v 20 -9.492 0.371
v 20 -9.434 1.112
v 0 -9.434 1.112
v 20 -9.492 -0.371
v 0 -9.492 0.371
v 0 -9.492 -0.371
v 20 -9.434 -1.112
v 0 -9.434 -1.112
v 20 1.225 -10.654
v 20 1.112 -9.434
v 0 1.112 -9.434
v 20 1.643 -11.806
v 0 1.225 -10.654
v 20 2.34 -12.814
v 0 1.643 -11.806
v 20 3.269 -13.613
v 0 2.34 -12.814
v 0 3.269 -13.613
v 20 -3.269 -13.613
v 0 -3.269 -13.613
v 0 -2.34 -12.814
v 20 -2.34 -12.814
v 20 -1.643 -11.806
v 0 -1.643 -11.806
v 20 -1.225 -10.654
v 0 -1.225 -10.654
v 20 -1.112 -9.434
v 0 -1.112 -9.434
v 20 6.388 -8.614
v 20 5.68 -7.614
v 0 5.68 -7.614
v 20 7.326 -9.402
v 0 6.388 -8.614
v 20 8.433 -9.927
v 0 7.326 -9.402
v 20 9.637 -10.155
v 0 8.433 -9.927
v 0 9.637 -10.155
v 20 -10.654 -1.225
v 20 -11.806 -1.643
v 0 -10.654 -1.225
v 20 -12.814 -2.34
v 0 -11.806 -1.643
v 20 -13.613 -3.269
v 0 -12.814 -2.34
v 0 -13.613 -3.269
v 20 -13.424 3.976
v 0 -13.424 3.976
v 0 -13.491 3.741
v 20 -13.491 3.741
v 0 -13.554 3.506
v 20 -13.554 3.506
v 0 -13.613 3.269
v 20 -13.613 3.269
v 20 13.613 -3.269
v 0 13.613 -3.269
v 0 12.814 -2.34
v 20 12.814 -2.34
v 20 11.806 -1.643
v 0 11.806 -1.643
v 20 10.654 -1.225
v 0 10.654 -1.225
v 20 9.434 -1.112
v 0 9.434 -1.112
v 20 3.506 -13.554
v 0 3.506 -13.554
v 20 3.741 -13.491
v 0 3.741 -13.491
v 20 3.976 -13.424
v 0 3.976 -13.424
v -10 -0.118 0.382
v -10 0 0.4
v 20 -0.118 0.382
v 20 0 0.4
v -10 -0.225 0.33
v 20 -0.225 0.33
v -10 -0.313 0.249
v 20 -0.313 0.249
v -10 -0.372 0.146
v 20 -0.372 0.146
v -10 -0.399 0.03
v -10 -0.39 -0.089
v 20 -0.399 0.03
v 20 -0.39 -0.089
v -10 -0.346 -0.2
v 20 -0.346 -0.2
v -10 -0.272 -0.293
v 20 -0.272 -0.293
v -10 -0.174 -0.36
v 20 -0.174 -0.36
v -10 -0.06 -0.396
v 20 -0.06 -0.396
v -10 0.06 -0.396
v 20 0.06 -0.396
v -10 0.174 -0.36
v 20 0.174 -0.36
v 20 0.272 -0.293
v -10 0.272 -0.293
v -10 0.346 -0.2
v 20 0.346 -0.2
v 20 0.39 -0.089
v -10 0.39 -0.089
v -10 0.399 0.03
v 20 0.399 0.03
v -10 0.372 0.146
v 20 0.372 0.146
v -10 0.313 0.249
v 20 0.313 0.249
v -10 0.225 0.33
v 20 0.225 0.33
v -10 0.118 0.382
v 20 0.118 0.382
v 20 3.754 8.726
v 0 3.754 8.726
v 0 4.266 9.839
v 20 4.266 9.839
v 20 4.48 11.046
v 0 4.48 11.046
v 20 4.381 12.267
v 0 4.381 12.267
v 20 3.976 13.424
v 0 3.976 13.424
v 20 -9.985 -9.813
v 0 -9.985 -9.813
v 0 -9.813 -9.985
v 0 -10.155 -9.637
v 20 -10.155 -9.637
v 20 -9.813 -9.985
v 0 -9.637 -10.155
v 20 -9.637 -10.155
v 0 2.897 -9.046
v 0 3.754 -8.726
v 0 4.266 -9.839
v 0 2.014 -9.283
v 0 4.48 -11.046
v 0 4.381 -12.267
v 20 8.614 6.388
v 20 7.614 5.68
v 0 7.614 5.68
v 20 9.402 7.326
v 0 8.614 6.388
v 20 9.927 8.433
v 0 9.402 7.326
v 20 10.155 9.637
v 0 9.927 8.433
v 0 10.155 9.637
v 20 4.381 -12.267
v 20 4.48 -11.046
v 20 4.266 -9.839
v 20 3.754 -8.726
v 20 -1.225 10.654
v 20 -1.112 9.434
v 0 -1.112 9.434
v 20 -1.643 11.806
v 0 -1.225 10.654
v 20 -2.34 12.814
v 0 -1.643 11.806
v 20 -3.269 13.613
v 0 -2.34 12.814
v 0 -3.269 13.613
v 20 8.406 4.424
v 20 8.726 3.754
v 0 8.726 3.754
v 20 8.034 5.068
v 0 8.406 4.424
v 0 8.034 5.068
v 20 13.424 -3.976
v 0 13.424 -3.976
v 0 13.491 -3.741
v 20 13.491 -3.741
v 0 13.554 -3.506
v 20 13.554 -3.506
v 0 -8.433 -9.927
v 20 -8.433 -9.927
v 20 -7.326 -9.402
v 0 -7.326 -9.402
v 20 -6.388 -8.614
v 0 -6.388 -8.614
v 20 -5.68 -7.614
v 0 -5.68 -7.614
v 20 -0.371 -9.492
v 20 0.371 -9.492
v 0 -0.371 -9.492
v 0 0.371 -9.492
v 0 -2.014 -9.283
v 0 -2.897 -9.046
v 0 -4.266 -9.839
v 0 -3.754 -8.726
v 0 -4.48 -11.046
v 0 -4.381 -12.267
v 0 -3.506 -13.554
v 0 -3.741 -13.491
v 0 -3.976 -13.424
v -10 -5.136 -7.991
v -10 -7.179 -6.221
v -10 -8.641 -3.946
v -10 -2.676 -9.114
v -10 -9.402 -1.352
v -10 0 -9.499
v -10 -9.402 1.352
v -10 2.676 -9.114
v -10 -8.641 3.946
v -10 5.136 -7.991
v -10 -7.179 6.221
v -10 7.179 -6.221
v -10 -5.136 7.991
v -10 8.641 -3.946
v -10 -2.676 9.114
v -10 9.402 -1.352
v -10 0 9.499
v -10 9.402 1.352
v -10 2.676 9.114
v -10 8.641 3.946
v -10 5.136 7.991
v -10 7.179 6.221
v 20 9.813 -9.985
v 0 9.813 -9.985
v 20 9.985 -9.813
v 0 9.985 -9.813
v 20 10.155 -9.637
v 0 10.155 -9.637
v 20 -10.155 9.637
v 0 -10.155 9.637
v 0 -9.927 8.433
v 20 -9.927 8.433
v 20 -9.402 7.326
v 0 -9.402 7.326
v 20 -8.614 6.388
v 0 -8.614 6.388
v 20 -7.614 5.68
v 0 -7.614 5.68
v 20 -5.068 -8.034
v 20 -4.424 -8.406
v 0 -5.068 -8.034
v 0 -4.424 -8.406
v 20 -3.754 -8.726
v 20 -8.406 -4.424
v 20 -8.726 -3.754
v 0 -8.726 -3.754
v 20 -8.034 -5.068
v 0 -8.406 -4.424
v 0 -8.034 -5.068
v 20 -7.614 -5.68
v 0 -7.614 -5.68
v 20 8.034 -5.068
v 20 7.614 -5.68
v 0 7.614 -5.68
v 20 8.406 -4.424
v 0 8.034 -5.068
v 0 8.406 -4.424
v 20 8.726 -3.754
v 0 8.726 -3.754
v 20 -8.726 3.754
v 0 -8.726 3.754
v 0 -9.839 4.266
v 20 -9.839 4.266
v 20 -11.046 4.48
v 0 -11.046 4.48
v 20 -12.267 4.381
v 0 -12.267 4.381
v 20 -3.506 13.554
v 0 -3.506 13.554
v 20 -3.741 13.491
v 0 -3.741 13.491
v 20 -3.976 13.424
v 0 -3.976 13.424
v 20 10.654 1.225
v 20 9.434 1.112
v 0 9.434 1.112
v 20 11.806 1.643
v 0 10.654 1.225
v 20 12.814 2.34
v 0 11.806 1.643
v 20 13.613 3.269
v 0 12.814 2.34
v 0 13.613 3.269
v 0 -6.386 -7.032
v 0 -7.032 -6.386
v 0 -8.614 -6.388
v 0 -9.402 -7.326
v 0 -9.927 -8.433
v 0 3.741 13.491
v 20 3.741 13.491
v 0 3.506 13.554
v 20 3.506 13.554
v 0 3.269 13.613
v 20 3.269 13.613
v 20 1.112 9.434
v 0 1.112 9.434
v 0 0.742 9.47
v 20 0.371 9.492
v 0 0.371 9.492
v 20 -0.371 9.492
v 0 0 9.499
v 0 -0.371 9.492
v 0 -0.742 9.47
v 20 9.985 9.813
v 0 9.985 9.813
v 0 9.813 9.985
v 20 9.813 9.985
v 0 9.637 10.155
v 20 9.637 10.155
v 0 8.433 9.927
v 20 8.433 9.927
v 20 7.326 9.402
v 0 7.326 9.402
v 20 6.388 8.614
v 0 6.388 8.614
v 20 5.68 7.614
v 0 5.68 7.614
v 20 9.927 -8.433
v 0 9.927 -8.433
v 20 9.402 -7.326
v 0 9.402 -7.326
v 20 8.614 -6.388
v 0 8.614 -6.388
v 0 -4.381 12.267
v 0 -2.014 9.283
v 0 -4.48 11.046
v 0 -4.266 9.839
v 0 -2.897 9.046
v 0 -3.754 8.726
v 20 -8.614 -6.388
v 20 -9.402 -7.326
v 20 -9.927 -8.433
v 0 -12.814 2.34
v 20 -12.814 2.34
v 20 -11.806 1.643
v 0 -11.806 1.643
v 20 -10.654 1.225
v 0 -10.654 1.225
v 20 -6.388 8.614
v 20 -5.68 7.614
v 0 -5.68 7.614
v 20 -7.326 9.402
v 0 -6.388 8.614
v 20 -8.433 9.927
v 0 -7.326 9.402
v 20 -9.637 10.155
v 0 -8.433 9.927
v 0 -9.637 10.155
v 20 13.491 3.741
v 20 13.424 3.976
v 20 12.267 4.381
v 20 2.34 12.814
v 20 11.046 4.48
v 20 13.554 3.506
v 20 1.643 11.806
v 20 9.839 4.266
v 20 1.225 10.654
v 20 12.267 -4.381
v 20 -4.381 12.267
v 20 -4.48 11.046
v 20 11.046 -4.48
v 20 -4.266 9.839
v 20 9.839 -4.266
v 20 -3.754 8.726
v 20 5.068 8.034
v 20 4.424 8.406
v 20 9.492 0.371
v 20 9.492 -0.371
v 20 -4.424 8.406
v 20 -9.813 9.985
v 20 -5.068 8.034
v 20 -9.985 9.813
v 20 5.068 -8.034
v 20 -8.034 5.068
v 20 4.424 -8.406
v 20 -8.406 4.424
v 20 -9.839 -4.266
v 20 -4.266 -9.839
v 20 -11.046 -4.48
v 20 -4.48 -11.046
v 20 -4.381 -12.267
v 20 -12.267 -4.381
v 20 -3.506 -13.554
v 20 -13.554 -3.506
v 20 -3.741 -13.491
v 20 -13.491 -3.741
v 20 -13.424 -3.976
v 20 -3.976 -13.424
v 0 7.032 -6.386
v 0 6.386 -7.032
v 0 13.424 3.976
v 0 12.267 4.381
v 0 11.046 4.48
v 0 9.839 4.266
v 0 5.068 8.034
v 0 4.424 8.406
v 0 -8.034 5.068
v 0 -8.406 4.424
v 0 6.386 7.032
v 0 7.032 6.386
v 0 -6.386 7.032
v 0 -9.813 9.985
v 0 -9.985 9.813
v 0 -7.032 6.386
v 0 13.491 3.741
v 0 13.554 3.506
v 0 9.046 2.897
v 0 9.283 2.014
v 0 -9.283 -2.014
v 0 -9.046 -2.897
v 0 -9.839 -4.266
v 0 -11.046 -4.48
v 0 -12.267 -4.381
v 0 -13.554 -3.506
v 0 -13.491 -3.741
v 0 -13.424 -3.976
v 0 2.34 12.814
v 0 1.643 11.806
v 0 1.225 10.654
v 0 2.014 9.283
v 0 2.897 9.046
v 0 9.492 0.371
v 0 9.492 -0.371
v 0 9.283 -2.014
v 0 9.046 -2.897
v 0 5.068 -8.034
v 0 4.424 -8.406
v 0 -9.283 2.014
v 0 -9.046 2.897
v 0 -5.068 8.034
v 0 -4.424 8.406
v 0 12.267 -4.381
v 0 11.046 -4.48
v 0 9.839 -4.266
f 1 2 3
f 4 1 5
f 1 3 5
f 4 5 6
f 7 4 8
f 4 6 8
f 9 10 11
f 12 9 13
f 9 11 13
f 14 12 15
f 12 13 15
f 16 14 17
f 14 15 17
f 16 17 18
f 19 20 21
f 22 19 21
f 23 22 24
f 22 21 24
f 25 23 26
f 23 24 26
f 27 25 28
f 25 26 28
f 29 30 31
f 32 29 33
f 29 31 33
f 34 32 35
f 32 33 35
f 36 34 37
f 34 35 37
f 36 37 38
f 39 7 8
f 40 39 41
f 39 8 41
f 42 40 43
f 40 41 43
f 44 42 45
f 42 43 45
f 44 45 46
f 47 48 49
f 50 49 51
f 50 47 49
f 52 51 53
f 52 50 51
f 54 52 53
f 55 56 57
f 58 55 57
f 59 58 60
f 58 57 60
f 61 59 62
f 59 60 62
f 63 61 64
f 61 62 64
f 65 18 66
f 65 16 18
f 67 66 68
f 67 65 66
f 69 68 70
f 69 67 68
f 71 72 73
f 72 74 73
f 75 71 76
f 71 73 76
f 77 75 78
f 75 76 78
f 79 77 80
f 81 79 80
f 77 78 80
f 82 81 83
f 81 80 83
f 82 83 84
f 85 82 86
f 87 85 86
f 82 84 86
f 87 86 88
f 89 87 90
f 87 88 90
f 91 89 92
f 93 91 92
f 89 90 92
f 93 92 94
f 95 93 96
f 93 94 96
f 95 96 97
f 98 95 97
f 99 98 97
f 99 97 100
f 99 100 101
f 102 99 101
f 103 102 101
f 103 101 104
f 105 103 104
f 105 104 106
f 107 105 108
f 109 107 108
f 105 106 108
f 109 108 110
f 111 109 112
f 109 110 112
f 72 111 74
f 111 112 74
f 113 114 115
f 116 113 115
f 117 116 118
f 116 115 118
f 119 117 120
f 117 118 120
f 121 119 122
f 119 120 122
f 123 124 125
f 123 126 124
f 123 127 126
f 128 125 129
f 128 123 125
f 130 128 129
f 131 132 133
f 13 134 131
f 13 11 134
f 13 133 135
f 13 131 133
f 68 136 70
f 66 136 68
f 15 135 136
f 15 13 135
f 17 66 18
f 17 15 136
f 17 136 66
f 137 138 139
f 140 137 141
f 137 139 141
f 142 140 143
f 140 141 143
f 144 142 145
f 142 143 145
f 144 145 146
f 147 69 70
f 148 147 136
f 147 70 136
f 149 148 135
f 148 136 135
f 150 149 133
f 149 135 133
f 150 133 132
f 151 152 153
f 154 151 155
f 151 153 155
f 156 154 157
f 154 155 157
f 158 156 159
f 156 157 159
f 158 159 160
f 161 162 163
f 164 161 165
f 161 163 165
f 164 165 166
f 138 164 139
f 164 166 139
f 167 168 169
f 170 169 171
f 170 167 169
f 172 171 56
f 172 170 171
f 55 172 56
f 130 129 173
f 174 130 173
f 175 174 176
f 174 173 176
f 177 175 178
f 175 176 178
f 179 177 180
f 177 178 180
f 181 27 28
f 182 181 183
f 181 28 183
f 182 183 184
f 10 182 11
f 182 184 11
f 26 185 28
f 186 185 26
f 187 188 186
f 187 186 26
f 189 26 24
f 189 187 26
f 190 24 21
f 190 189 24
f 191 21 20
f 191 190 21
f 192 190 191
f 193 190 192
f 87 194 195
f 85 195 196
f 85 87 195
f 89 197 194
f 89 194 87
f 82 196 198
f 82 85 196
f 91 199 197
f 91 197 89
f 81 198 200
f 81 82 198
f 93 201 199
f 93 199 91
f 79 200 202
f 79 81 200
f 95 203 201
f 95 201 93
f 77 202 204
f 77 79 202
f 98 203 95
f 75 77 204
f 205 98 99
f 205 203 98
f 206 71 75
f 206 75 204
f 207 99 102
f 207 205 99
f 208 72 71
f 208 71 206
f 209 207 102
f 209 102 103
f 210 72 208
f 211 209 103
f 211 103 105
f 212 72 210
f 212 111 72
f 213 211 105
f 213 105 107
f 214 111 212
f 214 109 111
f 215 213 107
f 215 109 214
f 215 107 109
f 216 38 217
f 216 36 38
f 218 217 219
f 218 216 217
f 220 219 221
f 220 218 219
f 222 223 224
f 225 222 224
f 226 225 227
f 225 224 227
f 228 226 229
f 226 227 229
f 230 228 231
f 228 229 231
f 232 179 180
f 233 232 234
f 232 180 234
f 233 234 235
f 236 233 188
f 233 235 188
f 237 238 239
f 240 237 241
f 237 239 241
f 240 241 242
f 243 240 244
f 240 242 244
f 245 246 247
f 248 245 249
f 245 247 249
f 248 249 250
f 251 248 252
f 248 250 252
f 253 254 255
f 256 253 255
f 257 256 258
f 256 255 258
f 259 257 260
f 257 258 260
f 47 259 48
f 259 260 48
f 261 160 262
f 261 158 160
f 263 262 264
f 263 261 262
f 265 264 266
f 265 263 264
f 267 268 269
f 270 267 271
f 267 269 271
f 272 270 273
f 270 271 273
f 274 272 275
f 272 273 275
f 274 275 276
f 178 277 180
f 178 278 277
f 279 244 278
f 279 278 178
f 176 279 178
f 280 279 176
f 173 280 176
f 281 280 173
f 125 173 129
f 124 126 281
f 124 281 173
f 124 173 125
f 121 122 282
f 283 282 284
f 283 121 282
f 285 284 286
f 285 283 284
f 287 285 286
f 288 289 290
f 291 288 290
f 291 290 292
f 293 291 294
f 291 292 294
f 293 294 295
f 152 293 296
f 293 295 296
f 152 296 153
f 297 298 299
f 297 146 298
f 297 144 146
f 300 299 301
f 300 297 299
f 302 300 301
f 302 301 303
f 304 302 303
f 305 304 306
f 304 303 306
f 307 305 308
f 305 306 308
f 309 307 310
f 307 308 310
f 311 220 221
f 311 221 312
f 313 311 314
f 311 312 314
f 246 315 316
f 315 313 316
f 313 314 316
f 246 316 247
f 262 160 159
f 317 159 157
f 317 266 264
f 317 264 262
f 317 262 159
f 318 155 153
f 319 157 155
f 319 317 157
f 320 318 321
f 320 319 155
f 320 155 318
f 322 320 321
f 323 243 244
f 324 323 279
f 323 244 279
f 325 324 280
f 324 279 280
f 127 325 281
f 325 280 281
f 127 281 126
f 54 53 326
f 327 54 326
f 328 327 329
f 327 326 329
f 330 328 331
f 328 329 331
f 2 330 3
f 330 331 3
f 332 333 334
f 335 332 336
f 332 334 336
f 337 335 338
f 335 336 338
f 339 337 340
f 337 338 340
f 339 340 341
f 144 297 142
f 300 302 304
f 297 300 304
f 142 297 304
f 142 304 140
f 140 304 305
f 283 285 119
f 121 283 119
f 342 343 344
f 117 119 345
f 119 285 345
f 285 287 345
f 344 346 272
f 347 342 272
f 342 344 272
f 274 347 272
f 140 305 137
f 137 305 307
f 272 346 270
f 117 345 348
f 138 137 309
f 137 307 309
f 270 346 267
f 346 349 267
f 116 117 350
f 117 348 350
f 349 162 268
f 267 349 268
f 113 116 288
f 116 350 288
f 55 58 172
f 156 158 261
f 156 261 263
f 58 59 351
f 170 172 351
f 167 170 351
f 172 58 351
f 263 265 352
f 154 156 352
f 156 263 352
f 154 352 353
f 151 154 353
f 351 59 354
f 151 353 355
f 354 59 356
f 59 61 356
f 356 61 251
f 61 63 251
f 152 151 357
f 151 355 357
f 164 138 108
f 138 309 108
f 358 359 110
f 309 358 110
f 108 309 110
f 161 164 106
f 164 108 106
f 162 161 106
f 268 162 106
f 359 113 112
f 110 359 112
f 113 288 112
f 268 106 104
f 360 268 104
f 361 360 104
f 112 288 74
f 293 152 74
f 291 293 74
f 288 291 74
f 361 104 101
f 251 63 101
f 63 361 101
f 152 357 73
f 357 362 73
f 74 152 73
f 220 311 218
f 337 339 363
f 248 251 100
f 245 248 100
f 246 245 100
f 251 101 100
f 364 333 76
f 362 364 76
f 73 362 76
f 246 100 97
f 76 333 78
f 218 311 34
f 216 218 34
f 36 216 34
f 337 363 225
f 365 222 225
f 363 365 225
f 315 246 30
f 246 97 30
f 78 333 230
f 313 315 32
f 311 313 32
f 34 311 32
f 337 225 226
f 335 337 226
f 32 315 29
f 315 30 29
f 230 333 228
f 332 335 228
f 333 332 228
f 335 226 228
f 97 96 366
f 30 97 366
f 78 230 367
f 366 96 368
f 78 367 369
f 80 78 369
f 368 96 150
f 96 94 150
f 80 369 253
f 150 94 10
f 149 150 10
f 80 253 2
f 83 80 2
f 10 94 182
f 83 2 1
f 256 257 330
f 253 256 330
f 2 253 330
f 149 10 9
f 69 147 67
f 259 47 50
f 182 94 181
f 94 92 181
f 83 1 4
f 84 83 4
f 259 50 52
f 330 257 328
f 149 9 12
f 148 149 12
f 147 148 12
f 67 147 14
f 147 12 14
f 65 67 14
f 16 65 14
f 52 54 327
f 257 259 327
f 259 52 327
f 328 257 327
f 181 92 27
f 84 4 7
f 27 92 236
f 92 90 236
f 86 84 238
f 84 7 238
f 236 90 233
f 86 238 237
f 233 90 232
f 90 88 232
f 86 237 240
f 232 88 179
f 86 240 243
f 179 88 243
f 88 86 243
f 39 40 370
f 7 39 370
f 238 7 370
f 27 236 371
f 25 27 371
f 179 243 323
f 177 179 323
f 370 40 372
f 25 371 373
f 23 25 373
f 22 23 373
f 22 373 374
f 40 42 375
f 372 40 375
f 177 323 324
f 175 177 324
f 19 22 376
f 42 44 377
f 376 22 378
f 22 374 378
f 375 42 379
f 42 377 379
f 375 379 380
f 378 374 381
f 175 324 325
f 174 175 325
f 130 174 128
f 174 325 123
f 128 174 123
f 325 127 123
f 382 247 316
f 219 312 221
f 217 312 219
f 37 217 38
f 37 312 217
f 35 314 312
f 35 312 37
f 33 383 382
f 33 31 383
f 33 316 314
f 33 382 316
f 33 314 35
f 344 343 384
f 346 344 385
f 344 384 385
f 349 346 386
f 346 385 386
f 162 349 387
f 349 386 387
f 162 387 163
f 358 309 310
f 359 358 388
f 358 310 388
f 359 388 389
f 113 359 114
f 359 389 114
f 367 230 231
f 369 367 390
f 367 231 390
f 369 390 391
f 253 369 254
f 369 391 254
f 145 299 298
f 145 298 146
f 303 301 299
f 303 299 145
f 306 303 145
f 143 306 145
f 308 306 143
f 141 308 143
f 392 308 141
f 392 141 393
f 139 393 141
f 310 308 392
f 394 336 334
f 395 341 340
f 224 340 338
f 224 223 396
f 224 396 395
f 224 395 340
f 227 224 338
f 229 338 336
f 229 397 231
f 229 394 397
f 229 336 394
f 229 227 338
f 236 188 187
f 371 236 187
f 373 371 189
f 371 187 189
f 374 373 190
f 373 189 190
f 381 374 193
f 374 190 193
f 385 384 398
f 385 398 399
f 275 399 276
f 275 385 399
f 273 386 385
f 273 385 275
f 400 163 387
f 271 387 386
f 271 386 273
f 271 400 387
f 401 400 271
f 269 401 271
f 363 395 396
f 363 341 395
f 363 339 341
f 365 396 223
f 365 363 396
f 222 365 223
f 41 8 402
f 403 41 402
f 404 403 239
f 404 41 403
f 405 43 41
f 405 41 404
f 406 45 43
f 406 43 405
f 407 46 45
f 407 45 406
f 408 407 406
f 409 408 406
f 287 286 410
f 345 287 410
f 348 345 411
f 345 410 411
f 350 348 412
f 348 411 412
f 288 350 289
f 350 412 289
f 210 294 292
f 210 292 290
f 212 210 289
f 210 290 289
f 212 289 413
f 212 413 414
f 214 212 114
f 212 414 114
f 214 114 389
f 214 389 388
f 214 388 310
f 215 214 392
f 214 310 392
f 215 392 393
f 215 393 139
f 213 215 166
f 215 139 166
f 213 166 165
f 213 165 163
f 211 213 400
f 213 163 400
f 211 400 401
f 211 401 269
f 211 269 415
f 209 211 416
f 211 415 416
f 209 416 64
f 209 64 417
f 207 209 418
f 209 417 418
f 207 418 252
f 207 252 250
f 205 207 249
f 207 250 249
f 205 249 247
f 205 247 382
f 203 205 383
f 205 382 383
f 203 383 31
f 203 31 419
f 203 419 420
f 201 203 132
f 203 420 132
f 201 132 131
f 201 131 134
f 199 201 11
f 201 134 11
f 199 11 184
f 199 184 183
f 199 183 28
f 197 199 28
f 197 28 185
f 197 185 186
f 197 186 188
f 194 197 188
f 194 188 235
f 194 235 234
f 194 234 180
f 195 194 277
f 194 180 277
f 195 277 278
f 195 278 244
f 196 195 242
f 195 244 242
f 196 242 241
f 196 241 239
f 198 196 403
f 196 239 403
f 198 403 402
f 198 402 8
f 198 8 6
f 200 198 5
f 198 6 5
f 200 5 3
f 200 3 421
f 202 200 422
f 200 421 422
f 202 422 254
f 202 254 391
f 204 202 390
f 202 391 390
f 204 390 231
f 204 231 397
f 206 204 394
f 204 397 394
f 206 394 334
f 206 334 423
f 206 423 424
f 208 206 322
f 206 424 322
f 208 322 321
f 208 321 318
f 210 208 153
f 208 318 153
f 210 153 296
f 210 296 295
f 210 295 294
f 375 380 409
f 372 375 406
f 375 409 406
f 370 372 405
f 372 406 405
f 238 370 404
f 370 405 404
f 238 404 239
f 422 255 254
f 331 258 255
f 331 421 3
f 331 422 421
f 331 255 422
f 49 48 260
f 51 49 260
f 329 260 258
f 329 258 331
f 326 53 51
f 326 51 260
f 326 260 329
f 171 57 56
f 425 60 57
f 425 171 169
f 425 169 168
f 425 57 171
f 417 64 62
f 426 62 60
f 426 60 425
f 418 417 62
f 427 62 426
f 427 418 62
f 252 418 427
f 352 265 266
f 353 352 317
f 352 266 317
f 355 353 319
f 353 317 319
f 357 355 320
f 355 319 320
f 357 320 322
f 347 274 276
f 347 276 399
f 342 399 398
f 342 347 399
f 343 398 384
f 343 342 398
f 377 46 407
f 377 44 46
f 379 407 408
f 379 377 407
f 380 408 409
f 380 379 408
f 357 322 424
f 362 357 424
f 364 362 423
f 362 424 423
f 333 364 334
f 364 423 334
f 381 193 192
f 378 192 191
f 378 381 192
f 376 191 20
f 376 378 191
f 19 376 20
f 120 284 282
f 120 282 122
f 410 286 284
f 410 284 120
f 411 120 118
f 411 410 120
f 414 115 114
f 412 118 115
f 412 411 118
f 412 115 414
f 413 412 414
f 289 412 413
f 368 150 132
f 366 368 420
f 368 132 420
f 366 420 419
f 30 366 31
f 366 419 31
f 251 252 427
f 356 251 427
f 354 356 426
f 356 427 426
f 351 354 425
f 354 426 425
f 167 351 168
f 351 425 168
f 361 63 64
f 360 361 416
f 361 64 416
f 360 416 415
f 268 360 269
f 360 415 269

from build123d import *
from build123d.topology import SkipClean

# Parameters (mm, degrees)
BASPROSKE_W      = 20
BASPROSKE_H      = 14
TOOTHCUT_DEPTH   = 29.142494559
TEETHCUTS_COUNT  = 12
TEETHCUTS_ANGLE  = 330
HUBNEAONESKE_R   = 9.499
HUBNEARONE_DEPTH = 10.0000508
BORSKE_R         = 0.4
BORE_DEPTH       = 30.0000508


with BuildPart() as part:
    # BasProSke → Base-Revolve (revolve)
    with BuildSketch(Plane(origin=(0, 0, 0), x_dir=(1, 0, 0), z_dir=(0, 1, 0)), mode=Mode.PRIVATE) as base_revolve_sk:
        with Locations((10, 7)):
            Rectangle(BASPROSKE_W, BASPROSKE_H)
    revolve(base_revolve_sk.sketch.rotate(Axis((-10, 0, 0), (1, 0, 0)), 180), axis=Axis((-10, 0, 0), (1, 0, 0)))

    # TooCutSke → ToothCut (cut, through all)
    with BuildSketch(Plane(origin=(0, 0, 0), x_dir=(0, 0, -1), z_dir=(1, 0, 0))):
        with BuildLine():
            ThreePointArc((1.111908866, 9.433698091), (0, 9.499), (-1.111908866, 9.433698091))
            ThreePointArc((-1.111908866, 9.433698091), (-1.651516138, 11.821129337), (-3.298149691, 13.632096456))
            ThreePointArc((-3.298149691, 13.632096456), (0, 14.0254), (3.298149691, 13.632096456))
            ThreePointArc((3.298149691, 13.632096456), (1.651516138, 11.821129337), (1.111908866, 9.433698091))
        make_face()
    toothcut = extrude(amount=TOOTHCUT_DEPTH, mode=Mode.SUBTRACT)

    # TeethCuts: ToothCut ×12 about axis
    teethcuts_axis = Axis((-10, 0, 0), (1, 0, 0))
    for i in range(1, TEETHCUTS_COUNT):
        add(toothcut.rotate(teethcuts_axis, i * TEETHCUTS_ANGLE / (TEETHCUTS_COUNT - 1)), mode=Mode.SUBTRACT)

    # HubNeaOneSke → HubNearOne (add)
    with SkipClean():  # the faces are left unmerged after this step: merging them gives an invalid solid
        with BuildSketch(Plane.ZY):
            Circle(HUBNEAONESKE_R)
        extrude(amount=HUBNEARONE_DEPTH)

    # BorSke → Bore (cut, symmetric)
    with SkipClean():  # the faces are left unmerged after this step: merging them gives an invalid solid
        with BuildSketch(Plane(origin=(0, 0, 0), x_dir=(0, 0, -1), z_dir=(1, 0, 0))):
            with Locations(Location((0, 0, 0), (0, 0, 180))):
                Circle(BORSKE_R)
        extrude(amount=BORE_DEPTH, both=True, mode=Mode.SUBTRACT)


solid = part.part
